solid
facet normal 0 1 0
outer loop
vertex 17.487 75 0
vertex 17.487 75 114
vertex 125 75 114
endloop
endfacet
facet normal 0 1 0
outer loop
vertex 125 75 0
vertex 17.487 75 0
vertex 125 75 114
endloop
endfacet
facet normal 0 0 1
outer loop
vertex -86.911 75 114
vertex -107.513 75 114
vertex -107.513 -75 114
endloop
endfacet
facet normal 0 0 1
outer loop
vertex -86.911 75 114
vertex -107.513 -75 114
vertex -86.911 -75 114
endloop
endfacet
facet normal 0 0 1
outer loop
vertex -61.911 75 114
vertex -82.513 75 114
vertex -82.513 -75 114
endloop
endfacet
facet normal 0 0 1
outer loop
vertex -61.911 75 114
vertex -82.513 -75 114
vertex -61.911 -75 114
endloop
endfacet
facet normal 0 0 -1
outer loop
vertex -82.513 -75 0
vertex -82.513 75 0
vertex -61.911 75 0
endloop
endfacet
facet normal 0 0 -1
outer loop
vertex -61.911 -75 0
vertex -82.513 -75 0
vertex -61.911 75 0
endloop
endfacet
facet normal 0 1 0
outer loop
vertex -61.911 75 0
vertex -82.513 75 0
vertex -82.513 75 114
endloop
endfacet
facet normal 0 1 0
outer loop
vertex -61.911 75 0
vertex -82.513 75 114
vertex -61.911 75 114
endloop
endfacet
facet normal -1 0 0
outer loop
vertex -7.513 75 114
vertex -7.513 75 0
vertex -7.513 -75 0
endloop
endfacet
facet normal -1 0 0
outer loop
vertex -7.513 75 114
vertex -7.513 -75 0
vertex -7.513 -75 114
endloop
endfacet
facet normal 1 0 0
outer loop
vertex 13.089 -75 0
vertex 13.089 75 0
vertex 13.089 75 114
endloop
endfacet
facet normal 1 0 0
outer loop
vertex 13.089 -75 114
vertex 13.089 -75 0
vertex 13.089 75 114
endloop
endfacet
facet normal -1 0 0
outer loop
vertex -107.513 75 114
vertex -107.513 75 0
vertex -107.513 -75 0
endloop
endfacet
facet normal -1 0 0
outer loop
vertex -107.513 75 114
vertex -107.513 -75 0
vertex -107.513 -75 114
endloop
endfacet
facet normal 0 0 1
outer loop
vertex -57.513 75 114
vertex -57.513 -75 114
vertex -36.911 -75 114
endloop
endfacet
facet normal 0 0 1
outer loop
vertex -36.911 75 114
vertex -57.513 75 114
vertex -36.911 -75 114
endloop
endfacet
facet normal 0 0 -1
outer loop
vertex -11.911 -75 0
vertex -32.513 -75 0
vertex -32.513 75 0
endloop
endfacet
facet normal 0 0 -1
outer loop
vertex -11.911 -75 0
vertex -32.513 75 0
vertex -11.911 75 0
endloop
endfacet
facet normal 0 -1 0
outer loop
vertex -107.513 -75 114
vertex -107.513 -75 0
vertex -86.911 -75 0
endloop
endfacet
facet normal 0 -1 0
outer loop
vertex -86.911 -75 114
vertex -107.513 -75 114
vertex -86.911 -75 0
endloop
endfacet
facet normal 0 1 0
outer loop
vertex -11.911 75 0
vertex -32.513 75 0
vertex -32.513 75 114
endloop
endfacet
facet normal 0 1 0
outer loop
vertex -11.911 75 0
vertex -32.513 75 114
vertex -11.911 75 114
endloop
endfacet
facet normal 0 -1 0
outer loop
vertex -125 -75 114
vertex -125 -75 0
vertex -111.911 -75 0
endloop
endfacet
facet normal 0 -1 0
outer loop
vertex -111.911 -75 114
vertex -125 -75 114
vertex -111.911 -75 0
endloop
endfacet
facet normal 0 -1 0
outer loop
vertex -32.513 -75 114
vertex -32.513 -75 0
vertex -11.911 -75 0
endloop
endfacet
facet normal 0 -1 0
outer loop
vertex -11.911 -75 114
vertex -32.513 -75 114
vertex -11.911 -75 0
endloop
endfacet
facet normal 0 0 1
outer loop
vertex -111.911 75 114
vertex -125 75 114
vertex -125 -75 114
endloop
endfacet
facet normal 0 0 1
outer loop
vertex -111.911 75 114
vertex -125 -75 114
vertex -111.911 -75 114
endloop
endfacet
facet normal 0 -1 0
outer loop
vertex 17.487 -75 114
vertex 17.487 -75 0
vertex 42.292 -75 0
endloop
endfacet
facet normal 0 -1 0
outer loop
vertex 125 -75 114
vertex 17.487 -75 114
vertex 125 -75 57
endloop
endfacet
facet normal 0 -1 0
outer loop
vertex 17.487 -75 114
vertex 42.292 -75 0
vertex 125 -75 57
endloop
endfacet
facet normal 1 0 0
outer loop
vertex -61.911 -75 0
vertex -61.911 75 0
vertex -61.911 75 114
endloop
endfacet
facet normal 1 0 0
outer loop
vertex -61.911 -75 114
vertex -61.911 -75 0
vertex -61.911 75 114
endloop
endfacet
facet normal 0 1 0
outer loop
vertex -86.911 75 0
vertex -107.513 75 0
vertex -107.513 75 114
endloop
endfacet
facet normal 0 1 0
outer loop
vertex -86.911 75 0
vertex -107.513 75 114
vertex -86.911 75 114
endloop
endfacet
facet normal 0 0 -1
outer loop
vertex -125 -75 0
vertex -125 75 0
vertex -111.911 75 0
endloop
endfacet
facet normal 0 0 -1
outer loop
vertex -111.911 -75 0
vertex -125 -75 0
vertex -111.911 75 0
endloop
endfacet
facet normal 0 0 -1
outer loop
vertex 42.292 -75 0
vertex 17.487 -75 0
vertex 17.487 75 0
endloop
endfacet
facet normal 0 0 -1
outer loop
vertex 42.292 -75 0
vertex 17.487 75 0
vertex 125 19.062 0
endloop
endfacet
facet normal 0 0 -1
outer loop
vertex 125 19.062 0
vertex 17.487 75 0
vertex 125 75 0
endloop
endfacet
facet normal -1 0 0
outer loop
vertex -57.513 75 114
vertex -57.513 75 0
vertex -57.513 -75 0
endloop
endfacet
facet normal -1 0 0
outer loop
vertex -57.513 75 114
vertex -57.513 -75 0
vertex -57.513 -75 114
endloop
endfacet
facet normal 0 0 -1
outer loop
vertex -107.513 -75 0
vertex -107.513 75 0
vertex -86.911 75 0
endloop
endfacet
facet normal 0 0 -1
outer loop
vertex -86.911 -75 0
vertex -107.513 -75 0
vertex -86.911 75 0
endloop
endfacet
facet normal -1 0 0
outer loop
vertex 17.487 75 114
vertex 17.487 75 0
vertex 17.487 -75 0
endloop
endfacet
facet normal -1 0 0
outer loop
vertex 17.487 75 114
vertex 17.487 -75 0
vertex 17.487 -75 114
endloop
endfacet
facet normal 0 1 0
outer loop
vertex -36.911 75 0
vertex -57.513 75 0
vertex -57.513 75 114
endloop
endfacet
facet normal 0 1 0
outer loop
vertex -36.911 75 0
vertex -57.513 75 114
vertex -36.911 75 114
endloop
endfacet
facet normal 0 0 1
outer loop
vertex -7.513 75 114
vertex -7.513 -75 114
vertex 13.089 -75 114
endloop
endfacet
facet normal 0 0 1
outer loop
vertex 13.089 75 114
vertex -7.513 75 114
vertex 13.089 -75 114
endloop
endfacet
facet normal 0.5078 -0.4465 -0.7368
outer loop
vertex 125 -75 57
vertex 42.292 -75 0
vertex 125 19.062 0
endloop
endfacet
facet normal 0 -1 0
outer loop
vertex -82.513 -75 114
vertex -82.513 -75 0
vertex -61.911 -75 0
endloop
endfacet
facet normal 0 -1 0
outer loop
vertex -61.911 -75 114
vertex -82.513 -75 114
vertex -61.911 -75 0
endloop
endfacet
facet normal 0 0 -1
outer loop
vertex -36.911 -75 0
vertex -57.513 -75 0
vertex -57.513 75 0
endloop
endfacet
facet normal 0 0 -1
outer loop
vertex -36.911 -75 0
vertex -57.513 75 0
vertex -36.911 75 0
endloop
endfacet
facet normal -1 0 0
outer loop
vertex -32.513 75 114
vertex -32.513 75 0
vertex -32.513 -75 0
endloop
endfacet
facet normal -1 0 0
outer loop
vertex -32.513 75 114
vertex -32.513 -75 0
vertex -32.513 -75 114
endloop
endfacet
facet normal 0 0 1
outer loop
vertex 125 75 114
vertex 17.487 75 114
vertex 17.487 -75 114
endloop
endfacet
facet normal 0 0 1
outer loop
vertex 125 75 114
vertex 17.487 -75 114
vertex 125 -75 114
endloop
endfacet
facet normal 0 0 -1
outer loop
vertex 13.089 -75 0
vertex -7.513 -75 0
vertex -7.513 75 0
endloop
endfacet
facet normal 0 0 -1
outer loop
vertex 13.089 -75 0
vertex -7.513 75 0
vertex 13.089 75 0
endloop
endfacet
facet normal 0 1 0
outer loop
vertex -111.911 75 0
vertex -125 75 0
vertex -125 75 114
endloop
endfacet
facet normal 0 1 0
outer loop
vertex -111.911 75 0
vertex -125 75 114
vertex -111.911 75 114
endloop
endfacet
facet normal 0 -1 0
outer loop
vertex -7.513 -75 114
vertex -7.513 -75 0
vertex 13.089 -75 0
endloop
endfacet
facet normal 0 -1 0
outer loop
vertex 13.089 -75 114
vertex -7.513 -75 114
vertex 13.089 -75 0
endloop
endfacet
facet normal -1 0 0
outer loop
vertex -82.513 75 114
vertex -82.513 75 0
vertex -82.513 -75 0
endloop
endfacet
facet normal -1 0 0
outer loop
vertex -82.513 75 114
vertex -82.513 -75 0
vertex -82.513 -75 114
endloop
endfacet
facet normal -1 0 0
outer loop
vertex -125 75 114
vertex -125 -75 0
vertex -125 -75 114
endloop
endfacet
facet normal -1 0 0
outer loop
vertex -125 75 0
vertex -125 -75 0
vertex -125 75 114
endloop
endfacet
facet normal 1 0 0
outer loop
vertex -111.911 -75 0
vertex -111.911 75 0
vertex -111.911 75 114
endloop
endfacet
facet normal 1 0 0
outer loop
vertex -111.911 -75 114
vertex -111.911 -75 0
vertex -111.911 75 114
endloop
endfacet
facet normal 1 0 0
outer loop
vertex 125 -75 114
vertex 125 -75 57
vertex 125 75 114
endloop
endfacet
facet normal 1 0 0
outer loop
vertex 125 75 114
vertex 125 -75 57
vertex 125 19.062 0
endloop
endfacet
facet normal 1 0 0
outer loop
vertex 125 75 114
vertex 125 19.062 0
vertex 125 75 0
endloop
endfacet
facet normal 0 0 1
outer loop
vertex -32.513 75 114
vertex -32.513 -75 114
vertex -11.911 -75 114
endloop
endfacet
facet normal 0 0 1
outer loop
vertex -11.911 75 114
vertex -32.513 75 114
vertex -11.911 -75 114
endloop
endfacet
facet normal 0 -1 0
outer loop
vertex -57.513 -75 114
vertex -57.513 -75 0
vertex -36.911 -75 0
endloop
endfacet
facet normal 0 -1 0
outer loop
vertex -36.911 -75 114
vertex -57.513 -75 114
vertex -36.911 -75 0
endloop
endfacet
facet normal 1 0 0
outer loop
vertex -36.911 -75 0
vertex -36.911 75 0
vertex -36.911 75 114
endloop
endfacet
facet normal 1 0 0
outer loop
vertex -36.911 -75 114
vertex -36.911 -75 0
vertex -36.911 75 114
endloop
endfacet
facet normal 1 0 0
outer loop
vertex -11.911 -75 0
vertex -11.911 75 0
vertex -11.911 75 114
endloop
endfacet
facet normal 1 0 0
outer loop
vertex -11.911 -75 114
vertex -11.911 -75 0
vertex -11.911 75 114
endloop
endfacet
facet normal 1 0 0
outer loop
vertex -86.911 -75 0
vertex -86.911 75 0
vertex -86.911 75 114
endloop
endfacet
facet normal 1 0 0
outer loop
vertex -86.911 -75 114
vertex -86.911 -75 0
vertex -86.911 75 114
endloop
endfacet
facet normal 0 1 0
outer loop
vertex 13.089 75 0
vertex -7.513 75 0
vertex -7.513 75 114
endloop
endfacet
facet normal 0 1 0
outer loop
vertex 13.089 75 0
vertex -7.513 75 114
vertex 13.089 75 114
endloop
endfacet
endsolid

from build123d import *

# Parameters (mm, degrees)
SKETCH1_W           = 250
SKETCH1_H           = 150
BOSS_EXTRUDE1_DEPTH = 114
SKETCH4_W           = 158.825989779
SKETCH4_H           = 169.09880145
CUT_EXTRUDE1_DEPTH  = 114
SKETCH5_W           = 4.398089603
SKETCH5_H           = 146.602986765
CUT_EXTRUDE2_DEPTH  = 227.099535603
LPATTERN1_COUNT     = 6
LPATTERN1_PITCH     = 25


with BuildPart() as part:
    # Sketch1 → Boss-Extrude1 (new body)
    with BuildSketch(Plane.XY):
        Rectangle(SKETCH1_W, SKETCH1_H)
    extrude(amount=BOSS_EXTRUDE1_DEPTH)

    # Sketch4 → Cut-Extrude1 (cut)
    with BuildSketch(Plane(origin=(27.906934923, -24.538252492, -40.49320945), x_dir=(0.8614948455361232, 0.2631519435385569, 0.4342553231988889), z_dir=(-0.5077663154588844, 0.4464731827403718, 0.7367734156299286))):
        with Locations((63.082324951, -59.282681283)):
            Rectangle(SKETCH4_W, SKETCH4_H)
    extrude(amount=-CUT_EXTRUDE1_DEPTH, mode=Mode.SUBTRACT)

    # Sketch5 → Cut-Extrude2 (cut, through all)
    with BuildSketch(Plane.XZ.offset(75)):
        with Locations((-109.711931847, 57.244338312)):
            Rectangle(SKETCH5_W, SKETCH5_H)
    cut_extrude2 = extrude(amount=-CUT_EXTRUDE2_DEPTH, mode=Mode.SUBTRACT)


with BuildPart() as cut_extrude2_piece_1:
    # of the separate pieces the step leaves, piece 1, a body of its own (cut_extrude2_pieces)
    add(part.part.solids().sort_by_distance((-107.512887045, -75, 0))[0])

    # LPattern1: Cut-Extrude2 ×6
    with Locations(*[(i * LPATTERN1_PITCH, 0, 0) for i in range(1, LPATTERN1_COUNT)]):
        add(cut_extrude2, mode=Mode.SUBTRACT)


with BuildPart() as cut_extrude2_piece_2:
    # of the separate pieces the step leaves, piece 2, a body of its own (cut_extrude2_pieces)
    add(part.part.solids().sort_by_distance((-125, -75, 0))[0])


solid = Compound([cut_extrude2_piece_1.part, cut_extrude2_piece_2.part])
